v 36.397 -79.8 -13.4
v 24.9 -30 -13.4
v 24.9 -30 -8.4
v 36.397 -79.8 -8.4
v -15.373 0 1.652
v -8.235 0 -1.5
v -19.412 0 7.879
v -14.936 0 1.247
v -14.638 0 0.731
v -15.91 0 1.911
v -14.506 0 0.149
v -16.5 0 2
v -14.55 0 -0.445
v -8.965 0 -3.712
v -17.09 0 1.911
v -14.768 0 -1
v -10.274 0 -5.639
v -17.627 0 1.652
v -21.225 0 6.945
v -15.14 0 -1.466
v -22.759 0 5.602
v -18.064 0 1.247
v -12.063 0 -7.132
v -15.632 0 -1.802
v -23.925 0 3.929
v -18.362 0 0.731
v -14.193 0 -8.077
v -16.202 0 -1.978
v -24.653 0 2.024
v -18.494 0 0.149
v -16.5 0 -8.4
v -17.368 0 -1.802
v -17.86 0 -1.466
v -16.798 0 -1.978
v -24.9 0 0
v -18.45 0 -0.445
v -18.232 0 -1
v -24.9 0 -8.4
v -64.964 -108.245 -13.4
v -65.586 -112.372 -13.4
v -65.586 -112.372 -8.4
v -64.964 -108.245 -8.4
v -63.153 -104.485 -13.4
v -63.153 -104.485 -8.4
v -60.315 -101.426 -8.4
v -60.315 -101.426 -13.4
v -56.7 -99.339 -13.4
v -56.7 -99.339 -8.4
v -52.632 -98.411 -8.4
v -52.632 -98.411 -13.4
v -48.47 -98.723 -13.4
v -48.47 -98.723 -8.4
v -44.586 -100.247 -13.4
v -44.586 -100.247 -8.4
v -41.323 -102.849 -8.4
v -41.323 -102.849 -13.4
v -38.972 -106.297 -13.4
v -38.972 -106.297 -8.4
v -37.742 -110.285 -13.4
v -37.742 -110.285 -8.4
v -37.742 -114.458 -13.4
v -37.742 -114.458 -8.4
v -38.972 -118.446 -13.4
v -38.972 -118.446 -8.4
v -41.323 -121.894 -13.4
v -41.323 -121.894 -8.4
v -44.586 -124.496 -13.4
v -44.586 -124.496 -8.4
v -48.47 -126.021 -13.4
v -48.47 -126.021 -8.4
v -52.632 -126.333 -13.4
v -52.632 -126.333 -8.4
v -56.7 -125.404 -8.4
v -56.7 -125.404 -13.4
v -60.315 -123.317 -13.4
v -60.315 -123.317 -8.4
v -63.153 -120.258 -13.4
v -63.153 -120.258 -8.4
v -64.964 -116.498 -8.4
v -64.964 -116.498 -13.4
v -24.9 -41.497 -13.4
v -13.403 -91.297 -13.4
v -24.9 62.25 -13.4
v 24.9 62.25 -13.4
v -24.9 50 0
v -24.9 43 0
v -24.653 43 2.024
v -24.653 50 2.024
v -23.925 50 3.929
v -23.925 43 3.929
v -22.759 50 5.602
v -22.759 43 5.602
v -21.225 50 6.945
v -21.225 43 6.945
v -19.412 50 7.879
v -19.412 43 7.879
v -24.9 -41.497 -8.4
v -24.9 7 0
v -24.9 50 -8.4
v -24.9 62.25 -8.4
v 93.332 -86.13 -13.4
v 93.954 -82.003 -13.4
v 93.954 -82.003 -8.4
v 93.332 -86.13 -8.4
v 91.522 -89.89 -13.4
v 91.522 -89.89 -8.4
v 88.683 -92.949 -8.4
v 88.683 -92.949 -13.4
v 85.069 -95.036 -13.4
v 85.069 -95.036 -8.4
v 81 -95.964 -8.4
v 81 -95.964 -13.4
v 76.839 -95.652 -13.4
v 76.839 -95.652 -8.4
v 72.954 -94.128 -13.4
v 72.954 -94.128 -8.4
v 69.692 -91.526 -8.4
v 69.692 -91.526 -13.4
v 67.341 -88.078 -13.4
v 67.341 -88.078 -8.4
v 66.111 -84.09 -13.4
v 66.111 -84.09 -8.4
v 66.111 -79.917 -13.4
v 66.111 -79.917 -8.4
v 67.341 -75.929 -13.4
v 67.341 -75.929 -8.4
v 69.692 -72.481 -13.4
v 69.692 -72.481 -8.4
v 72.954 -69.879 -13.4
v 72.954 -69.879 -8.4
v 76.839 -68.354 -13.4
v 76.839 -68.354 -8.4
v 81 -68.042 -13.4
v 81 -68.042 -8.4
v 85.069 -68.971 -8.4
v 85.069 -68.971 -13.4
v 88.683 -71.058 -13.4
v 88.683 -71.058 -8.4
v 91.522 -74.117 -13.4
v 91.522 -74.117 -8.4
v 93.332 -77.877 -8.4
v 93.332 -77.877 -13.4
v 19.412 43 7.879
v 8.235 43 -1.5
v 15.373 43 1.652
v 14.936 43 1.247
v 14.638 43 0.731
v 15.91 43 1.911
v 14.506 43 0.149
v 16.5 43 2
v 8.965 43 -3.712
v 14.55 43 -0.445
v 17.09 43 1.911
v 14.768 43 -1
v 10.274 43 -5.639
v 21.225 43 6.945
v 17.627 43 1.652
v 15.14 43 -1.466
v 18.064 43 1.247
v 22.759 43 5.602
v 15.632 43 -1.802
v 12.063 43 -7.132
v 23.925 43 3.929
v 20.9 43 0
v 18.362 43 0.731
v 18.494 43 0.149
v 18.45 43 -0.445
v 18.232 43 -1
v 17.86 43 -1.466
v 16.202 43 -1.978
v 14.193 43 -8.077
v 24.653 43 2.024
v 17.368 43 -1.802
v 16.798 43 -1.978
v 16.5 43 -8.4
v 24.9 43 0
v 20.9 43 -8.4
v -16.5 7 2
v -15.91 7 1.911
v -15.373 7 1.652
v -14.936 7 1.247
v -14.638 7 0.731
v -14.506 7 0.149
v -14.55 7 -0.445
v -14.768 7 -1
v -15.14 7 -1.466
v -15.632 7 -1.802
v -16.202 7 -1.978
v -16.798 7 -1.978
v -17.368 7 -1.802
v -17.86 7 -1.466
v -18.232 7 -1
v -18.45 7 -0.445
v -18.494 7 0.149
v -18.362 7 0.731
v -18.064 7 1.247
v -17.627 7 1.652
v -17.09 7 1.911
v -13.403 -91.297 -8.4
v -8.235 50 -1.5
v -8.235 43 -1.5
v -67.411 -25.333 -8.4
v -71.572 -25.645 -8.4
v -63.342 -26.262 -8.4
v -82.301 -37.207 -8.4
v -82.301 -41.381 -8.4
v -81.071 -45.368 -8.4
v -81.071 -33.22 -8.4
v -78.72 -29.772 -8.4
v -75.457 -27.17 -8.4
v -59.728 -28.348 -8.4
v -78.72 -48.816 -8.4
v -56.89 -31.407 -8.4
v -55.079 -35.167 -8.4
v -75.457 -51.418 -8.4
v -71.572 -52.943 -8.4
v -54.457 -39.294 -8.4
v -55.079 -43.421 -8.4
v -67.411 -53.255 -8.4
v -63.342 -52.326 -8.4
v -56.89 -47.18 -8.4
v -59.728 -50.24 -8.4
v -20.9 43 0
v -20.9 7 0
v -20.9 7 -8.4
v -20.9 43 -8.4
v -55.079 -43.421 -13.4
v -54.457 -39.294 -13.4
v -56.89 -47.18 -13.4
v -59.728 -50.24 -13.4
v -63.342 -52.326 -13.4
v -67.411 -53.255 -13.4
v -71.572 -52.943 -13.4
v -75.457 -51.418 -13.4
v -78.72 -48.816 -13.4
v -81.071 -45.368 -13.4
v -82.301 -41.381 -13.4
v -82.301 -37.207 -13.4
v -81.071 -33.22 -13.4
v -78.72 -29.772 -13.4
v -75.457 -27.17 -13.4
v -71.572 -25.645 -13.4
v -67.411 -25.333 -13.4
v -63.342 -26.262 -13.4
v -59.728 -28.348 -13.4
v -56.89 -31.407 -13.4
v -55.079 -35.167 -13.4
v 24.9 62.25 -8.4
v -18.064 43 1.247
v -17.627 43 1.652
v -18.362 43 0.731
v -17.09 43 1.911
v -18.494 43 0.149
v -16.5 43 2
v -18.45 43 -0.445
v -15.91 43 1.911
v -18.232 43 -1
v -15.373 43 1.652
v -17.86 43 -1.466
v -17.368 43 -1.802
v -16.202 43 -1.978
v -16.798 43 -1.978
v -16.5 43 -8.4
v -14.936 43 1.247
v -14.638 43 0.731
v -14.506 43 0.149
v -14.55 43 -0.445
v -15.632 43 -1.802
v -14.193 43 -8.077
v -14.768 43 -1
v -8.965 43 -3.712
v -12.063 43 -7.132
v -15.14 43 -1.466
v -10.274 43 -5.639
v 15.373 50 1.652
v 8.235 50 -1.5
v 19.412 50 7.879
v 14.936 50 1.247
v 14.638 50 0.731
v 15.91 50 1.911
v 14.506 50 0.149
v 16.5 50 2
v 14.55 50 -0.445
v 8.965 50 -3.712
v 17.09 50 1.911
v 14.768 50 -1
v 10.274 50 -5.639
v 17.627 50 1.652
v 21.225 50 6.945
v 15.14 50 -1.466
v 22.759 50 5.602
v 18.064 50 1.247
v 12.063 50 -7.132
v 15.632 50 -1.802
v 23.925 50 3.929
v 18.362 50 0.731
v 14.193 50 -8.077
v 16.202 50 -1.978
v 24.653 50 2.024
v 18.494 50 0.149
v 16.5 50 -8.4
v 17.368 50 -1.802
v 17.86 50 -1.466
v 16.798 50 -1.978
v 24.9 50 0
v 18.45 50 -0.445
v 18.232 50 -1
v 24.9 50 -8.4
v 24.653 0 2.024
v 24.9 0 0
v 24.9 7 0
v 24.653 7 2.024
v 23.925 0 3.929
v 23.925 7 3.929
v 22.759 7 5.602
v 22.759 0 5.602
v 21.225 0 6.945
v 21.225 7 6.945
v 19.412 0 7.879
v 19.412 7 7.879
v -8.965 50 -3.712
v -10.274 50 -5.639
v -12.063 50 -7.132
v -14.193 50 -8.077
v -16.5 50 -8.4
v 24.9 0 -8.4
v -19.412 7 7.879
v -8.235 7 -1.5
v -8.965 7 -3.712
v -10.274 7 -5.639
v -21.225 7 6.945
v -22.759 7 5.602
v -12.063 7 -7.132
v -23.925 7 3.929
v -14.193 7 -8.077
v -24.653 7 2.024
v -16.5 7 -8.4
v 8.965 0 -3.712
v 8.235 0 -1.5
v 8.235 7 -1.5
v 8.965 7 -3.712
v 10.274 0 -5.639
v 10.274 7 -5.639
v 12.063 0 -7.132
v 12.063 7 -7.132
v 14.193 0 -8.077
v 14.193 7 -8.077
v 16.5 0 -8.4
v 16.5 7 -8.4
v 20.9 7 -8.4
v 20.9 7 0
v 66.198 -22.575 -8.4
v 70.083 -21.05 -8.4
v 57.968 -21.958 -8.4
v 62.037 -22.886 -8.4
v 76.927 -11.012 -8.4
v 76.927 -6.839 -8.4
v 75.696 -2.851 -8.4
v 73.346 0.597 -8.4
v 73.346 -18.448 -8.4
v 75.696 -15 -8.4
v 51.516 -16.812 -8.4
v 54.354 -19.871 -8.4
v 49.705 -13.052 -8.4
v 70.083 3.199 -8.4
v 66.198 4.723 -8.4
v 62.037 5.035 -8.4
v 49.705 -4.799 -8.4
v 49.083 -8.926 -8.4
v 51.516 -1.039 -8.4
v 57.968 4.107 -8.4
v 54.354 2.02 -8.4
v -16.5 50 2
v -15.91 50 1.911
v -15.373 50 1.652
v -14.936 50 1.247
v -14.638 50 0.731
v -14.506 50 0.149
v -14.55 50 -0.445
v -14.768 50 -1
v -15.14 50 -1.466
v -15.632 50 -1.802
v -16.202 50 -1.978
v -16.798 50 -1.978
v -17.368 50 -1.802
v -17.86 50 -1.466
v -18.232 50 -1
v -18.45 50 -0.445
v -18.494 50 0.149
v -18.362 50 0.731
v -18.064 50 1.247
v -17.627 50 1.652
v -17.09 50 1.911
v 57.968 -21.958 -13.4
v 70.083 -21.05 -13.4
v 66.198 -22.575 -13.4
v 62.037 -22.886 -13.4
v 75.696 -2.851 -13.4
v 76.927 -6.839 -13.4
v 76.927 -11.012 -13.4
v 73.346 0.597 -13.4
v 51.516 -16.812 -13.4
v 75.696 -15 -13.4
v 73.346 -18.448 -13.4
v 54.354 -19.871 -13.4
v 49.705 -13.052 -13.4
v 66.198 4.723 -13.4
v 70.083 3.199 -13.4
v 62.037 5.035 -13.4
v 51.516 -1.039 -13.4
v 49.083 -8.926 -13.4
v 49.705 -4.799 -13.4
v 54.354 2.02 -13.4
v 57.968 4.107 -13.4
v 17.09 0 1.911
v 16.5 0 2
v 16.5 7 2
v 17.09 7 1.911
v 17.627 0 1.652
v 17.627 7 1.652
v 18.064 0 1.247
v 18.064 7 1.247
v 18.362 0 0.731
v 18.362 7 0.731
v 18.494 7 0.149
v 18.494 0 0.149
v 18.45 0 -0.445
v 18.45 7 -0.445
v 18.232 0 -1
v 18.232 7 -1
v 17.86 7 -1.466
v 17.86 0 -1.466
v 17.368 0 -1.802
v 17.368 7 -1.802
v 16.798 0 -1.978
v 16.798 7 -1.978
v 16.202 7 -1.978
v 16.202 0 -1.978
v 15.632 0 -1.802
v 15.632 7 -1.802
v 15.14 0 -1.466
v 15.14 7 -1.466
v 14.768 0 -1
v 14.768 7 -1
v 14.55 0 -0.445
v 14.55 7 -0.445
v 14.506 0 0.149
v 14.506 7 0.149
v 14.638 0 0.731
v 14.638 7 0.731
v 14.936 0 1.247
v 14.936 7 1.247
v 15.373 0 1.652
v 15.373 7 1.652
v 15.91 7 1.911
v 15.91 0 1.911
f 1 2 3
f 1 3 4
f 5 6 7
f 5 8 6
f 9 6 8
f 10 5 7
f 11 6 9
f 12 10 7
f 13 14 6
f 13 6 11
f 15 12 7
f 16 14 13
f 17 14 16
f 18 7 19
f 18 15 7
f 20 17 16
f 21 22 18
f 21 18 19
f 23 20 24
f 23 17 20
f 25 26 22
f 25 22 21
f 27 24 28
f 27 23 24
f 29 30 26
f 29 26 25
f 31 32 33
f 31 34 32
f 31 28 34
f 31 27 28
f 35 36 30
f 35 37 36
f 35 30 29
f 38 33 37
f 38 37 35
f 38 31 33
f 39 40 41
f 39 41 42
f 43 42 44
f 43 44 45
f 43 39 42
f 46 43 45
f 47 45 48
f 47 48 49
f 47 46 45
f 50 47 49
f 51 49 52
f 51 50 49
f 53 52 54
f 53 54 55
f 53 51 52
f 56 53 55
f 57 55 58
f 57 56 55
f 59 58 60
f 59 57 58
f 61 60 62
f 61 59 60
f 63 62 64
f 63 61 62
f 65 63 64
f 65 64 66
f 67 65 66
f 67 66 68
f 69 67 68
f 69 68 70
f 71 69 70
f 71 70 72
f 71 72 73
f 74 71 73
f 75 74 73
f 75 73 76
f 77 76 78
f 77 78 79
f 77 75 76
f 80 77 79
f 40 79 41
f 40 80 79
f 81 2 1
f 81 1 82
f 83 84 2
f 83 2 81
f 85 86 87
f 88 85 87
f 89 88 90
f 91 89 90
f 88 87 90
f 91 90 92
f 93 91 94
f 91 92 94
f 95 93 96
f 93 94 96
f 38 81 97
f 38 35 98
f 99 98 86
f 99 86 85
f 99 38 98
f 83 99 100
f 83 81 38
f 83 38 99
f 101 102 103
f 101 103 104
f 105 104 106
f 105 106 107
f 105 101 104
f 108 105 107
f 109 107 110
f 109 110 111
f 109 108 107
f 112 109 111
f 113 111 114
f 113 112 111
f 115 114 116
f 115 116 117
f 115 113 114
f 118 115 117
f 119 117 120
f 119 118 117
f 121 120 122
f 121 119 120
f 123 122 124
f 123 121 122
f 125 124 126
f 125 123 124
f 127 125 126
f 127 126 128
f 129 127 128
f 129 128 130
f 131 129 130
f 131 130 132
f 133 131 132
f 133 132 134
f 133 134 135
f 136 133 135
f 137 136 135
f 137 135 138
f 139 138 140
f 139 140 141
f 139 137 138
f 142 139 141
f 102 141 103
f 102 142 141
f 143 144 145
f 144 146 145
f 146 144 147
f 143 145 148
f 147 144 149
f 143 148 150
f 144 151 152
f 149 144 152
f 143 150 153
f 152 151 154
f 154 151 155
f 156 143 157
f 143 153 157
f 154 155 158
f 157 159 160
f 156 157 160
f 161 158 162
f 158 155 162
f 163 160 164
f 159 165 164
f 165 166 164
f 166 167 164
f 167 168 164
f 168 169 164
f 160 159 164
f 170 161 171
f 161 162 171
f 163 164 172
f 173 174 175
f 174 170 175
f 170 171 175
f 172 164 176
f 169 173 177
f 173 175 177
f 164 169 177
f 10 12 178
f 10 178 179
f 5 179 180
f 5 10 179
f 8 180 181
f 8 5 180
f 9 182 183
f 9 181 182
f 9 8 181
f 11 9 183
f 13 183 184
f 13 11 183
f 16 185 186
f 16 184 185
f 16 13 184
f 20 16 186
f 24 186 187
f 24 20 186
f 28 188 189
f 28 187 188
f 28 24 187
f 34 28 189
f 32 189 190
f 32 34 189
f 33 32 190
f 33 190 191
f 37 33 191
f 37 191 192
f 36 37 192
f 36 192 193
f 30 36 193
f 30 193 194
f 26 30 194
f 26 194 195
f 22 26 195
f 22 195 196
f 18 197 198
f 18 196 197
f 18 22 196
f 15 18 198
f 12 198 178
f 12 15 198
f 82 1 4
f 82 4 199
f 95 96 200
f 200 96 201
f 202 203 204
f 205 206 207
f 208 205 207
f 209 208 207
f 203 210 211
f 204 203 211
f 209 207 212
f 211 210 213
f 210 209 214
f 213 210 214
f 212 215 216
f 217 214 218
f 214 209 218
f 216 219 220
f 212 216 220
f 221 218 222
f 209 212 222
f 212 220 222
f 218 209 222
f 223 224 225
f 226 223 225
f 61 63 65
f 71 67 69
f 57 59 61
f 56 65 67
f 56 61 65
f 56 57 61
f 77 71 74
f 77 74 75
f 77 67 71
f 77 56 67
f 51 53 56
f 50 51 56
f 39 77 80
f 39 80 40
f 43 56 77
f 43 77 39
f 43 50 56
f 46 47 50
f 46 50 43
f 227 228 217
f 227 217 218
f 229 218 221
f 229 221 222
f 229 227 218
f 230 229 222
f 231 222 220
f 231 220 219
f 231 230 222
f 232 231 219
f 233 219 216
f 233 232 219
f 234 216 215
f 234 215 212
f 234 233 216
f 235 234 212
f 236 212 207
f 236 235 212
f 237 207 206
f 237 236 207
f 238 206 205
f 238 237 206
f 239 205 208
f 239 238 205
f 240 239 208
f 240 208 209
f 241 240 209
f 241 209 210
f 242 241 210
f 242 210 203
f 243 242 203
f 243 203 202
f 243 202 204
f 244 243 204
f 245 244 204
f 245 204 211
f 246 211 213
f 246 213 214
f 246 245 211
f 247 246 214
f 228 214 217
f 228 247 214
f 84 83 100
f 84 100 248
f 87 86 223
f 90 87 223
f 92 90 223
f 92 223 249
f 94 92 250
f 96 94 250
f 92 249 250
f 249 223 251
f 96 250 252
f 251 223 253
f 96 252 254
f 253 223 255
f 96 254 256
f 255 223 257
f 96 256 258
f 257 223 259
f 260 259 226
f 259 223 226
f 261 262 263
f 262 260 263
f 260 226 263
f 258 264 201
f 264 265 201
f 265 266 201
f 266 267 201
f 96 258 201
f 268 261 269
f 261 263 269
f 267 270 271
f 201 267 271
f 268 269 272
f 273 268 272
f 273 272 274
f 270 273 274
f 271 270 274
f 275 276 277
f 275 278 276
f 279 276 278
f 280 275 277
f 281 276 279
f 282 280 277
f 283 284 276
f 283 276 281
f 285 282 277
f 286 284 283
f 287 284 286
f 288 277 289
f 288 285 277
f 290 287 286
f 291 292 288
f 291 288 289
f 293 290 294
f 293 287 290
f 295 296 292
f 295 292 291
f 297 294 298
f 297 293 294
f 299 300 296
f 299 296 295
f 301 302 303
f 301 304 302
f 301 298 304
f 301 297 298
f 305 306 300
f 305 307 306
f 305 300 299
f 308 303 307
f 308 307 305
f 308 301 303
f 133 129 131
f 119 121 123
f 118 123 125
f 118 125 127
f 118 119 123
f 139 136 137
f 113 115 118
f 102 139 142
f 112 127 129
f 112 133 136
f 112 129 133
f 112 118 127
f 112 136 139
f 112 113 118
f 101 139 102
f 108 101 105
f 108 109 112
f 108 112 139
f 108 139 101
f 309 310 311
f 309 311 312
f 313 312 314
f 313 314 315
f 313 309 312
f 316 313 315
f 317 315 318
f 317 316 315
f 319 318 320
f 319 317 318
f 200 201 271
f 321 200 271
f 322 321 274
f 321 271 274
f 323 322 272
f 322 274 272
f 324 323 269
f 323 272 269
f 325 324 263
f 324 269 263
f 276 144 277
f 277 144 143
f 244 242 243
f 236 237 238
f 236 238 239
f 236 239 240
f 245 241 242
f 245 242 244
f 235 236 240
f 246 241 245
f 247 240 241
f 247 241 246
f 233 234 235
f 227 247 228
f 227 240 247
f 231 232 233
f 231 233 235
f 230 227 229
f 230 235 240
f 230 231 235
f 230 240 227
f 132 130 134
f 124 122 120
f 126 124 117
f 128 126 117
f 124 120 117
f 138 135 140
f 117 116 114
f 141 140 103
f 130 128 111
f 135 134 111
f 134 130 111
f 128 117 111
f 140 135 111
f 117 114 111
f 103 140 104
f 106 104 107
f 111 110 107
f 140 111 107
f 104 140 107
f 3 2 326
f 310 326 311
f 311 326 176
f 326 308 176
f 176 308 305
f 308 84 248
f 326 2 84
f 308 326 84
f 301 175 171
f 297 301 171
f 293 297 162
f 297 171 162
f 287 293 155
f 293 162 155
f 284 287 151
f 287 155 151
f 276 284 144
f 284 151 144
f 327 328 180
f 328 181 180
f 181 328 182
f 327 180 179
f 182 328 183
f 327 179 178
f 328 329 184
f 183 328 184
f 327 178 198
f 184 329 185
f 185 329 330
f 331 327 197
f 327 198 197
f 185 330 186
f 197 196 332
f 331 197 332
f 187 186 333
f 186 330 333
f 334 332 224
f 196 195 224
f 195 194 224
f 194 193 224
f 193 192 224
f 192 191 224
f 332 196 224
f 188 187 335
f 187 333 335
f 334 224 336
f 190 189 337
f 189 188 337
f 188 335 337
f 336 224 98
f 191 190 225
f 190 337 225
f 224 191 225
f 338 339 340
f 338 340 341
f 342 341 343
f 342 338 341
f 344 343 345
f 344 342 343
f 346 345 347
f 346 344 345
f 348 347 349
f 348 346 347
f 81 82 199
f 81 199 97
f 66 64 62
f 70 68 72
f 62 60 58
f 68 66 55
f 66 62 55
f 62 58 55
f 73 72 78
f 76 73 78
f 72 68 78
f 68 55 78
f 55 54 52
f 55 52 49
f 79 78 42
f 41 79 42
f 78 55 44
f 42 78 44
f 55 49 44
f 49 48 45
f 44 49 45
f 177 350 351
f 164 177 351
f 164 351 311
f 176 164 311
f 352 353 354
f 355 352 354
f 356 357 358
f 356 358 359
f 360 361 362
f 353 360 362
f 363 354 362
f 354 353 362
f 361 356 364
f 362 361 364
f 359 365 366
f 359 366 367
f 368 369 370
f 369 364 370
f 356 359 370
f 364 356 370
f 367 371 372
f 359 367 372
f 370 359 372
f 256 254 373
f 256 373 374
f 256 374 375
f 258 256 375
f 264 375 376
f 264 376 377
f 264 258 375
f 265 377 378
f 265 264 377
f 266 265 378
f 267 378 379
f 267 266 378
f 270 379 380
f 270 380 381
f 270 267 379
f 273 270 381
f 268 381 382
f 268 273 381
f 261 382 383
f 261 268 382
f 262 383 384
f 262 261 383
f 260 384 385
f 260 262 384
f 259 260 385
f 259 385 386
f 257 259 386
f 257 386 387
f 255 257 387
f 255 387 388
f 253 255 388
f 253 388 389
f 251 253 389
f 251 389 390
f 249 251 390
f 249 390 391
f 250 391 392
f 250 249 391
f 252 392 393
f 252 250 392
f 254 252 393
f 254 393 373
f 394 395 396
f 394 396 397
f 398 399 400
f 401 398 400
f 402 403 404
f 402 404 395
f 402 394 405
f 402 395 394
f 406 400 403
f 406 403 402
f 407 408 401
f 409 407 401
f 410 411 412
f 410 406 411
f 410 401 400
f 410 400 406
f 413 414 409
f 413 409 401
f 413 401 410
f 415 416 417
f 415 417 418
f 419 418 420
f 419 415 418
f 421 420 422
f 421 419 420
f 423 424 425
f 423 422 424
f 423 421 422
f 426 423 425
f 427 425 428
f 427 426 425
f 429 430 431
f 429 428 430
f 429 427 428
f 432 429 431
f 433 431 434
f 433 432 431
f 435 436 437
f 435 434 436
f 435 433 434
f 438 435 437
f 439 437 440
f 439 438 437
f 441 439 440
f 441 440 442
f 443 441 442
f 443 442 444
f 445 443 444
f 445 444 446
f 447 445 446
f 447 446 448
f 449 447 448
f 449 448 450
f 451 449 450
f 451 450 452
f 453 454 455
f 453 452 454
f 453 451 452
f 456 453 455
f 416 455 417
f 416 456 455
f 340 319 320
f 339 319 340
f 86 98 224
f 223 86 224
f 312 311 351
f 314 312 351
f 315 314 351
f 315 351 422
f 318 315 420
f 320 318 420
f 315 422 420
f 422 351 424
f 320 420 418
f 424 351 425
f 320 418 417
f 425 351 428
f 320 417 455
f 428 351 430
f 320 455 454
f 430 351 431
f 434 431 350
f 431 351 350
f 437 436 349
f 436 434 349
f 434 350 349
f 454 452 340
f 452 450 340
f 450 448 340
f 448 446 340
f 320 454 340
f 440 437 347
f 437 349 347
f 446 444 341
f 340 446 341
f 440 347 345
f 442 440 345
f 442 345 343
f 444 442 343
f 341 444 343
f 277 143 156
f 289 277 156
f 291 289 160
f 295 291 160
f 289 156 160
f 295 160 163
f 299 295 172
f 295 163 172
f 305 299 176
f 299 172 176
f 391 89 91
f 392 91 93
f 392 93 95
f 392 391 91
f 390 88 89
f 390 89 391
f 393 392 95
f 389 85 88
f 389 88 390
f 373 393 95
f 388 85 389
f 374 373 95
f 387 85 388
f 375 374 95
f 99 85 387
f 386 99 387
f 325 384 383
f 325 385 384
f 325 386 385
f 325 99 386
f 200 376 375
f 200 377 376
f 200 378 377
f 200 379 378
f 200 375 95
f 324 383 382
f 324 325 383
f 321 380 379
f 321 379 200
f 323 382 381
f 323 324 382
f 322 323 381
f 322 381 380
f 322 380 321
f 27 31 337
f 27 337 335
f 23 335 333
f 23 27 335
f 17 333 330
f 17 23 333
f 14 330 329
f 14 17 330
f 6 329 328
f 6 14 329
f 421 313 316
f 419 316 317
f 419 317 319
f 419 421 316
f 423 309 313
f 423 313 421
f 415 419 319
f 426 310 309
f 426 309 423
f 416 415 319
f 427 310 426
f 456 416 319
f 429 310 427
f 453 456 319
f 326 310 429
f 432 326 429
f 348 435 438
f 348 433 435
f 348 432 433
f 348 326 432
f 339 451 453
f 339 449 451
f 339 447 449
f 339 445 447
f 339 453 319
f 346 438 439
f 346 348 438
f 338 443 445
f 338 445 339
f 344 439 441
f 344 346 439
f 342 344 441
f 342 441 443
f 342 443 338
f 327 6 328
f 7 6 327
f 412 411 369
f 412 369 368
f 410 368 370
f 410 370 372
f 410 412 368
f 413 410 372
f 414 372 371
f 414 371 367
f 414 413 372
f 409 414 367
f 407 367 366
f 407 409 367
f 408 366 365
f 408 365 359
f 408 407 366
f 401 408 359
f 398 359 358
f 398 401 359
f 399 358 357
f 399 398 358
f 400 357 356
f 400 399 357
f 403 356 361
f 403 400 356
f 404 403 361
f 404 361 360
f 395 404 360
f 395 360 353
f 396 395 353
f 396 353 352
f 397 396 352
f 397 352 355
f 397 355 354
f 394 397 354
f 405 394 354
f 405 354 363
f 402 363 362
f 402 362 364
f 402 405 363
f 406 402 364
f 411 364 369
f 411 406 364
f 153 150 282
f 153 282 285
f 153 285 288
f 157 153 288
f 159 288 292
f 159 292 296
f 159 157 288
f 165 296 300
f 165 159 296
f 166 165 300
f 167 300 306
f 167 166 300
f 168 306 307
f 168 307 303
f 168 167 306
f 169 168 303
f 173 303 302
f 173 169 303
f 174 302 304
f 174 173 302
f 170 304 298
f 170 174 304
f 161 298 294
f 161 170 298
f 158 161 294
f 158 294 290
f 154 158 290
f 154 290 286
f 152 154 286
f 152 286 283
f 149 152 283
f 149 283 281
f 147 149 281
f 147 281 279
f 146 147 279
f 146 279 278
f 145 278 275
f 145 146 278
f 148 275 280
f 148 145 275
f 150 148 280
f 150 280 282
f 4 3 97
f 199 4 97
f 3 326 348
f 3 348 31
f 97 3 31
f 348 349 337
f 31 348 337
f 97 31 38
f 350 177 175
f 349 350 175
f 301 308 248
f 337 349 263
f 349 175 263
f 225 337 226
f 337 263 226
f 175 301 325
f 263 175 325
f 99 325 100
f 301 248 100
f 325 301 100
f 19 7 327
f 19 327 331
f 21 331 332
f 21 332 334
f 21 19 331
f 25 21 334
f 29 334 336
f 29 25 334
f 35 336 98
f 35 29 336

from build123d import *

# Parameters (mm, degrees)
BOSS_EXTRUDE2_DEPTH     = 7
CUT_EXTRUDE2_DEPTH      = 30.130224853
CUT_EXTRUDE2_DEPTH_BACK = 30.130224853
SKETCH3_R               = 2
BOSS_EXTRUDE3_DEPTH     = 36
SKETCH5_R               = 2
BOSS_EXTRUDE4_DEPTH     = 7
SKETCH13_W              = 49.8
SKETCH13_H              = 5
BOSS_EXTRUDE6_DEPTH     = 12.25
SKETCH15_W              = 49.8
SKETCH15_H              = 5
BOSS_EXTRUDE7_DEPTH     = 30
SKETCH12_R              = 14
BOSS_EXTRUDE8_DEPTH     = 5


with BuildPart() as part:
    # Sketch1 → Boss-Extrude2 (new body)
    with BuildSketch(Plane(origin=(0, 0, 0), x_dir=(1, 0, 0), z_dir=(0, 1, 0))):
        with BuildLine():
            Line((-24.9, 0), (-24.9, 13.4))
            Line((-24.9, 13.4), (24.9, 13.4))
            Line((24.9, 13.4), (24.9, 0))
            ThreePointArc((24.9, 0), (23.392904185, -4.800819919), (19.412411454, -7.878950407))
            Line((19.412411454, -7.878950407), (8.235013612, 1.5))
            ThreePointArc((8.235013612, 1.5), (11.116692467, 6.448255578), (16.5, 8.4))
            Line((16.5, 8.4), (-16.5, 8.4))
            ThreePointArc((-16.5, 8.4), (-11.116692467, 6.448255578), (-8.235013612, 1.5))
            Line((-8.235013612, 1.5), (-19.412411454, -7.878950407))
            ThreePointArc((-19.412411454, -7.878950407), (-23.392904185, -4.800819919), (-24.9, 0))
        make_face()
    extrude(amount=BOSS_EXTRUDE2_DEPTH)

    # Sketch3 → Cut-Extrude2 (cut, two sides: drawn at the far end of the back side and taken through both)
    with BuildSketch(Plane(origin=(0, 7, 0), x_dir=(1, 0, 0), z_dir=(0, 1, 0)).offset(-CUT_EXTRUDE2_DEPTH_BACK)):
        with Locations(Location((-16.5, 0, 0), (0, 0, 270))):
            Circle(SKETCH3_R)
        with Locations(Location((16.5, 0, 0), (0, 0, 270))):
            Circle(SKETCH3_R)
    extrude(amount=CUT_EXTRUDE2_DEPTH + CUT_EXTRUDE2_DEPTH_BACK, mode=Mode.SUBTRACT)

    # Sketch4 → Boss-Extrude3 (add)
    with BuildSketch(Plane(origin=(0, 7, 0), x_dir=(1, 0, 0), z_dir=(0, 1, 0))):
        Polygon((-24.9, 13.4), (-24.9, 0), (-20.9, 0), (-20.9, 8.4), (-16.5, 8.4), (16.5, 8.4), (20.9, 8.4), (20.9, 0), (24.9, 0), (24.9, 13.4), align=None)
    extrude(amount=BOSS_EXTRUDE3_DEPTH)

    # Sketch5 → Boss-Extrude4 (add)
    with BuildSketch(Plane(origin=(0, 43, 0), x_dir=(1, 0, 0), z_dir=(0, 1, 0))):
        with BuildLine():
            Line((-24.9, 13.4), (-24.9, 0))
            ThreePointArc((-24.9, 0), (-23.392904185, -4.800819919), (-19.412411454, -7.878950407))
            Line((-19.412411454, -7.878950407), (-8.235013612, 1.5))
            ThreePointArc((-8.235013612, 1.5), (-11.116692467, 6.448255578), (-16.5, 8.4))
            Line((-16.5, 8.4), (16.5, 8.4))
            ThreePointArc((16.5, 8.4), (11.116692467, 6.448255578), (8.235013612, 1.5))
            Line((8.235013612, 1.5), (19.412411454, -7.878950407))
            ThreePointArc((19.412411454, -7.878950407), (23.392904185, -4.800819919), (24.9, 0))
            Line((24.9, 0), (24.9, 13.4))
            Line((24.9, 13.4), (-24.9, 13.4))
        make_face()
        with Locations(Location((16.5, 0, 0), (0, 0, 270))):
            Circle(SKETCH5_R, mode=Mode.SUBTRACT)
        with Locations(Location((-16.5, 0, 0), (0, 0, 270))):
            Circle(SKETCH5_R, mode=Mode.SUBTRACT)
    extrude(amount=BOSS_EXTRUDE4_DEPTH)

    # Sketch13 → Boss-Extrude6 (add)
    with BuildSketch(Plane(origin=(0, 50, 0), x_dir=(1, 0, 0), z_dir=(0, 1, 0))):
        with Locations((0, 10.9)):
            Rectangle(SKETCH13_W, SKETCH13_H)
    extrude(amount=BOSS_EXTRUDE6_DEPTH)

    # Sketch15 → Boss-Extrude7 (add)
    with BuildSketch(Plane.XZ):
        with Locations((0, -10.9)):
            Rectangle(SKETCH15_W, SKETCH15_H)
    extrude(amount=BOSS_EXTRUDE7_DEPTH)

    # Sketch12 → Boss-Extrude8 (add)
    with BuildSketch(Plane(origin=(0, 0, -13.4), x_dir=(-1, 0, 0), z_dir=(0, 0, -1))):
        with Locations((-63.082932794, -8.925544361)):
            Circle(SKETCH12_R)
        with Locations(Location((-79.95426187, -82.00329922, 0), (0, 0, 180))):
            Circle(SKETCH12_R)
        with Locations(Location((68.457025952, -39.293936698, 0), (0, 0, 180))):
            Circle(SKETCH12_R)
        with Locations((51.585696876, -112.371691557)):
            Circle(SKETCH12_R)
        Polygon((-24.9, -30), (-36.397235918, -79.8), (13.402764082, -91.297235918), (24.9, -41.497235918), (24.9, -30), align=None)
    extrude(amount=-BOSS_EXTRUDE8_DEPTH)


with BuildPart() as boss_extrude8_piece_1:
    # of the separate pieces the step leaves, piece 1, a body of its own (boss_extrude8_pieces)
    add(part.part.solids().sort_by_distance((-8.235013612, 0, -1.5))[0])


with BuildPart() as boss_extrude8_piece_2:
    # of the separate pieces the step leaves, piece 2, a body of its own (boss_extrude8_pieces)
    add(part.part.solids().sort_by_distance((-65.585696876, -112.371691557, -13.4))[0])


with BuildPart() as boss_extrude8_piece_3:
    # of the separate pieces the step leaves, piece 3, a body of its own (boss_extrude8_pieces)
    add(part.part.solids().sort_by_distance((93.95426187, -82.00329922, -13.4))[0])


with BuildPart() as boss_extrude8_piece_4:
    # of the separate pieces the step leaves, piece 4, a body of its own (boss_extrude8_pieces)
    add(part.part.solids().sort_by_distance((-54.457025952, -39.293936698, -13.4))[0])


with BuildPart() as boss_extrude8_piece_5:
    # of the separate pieces the step leaves, piece 5, a body of its own (boss_extrude8_pieces)
    add(part.part.solids().sort_by_distance((49.082932794, -8.925544361, -13.4))[0])


solid = Compound([boss_extrude8_piece_1.part, boss_extrude8_piece_2.part, boss_extrude8_piece_3.part, boss_extrude8_piece_4.part, boss_extrude8_piece_5.part])
